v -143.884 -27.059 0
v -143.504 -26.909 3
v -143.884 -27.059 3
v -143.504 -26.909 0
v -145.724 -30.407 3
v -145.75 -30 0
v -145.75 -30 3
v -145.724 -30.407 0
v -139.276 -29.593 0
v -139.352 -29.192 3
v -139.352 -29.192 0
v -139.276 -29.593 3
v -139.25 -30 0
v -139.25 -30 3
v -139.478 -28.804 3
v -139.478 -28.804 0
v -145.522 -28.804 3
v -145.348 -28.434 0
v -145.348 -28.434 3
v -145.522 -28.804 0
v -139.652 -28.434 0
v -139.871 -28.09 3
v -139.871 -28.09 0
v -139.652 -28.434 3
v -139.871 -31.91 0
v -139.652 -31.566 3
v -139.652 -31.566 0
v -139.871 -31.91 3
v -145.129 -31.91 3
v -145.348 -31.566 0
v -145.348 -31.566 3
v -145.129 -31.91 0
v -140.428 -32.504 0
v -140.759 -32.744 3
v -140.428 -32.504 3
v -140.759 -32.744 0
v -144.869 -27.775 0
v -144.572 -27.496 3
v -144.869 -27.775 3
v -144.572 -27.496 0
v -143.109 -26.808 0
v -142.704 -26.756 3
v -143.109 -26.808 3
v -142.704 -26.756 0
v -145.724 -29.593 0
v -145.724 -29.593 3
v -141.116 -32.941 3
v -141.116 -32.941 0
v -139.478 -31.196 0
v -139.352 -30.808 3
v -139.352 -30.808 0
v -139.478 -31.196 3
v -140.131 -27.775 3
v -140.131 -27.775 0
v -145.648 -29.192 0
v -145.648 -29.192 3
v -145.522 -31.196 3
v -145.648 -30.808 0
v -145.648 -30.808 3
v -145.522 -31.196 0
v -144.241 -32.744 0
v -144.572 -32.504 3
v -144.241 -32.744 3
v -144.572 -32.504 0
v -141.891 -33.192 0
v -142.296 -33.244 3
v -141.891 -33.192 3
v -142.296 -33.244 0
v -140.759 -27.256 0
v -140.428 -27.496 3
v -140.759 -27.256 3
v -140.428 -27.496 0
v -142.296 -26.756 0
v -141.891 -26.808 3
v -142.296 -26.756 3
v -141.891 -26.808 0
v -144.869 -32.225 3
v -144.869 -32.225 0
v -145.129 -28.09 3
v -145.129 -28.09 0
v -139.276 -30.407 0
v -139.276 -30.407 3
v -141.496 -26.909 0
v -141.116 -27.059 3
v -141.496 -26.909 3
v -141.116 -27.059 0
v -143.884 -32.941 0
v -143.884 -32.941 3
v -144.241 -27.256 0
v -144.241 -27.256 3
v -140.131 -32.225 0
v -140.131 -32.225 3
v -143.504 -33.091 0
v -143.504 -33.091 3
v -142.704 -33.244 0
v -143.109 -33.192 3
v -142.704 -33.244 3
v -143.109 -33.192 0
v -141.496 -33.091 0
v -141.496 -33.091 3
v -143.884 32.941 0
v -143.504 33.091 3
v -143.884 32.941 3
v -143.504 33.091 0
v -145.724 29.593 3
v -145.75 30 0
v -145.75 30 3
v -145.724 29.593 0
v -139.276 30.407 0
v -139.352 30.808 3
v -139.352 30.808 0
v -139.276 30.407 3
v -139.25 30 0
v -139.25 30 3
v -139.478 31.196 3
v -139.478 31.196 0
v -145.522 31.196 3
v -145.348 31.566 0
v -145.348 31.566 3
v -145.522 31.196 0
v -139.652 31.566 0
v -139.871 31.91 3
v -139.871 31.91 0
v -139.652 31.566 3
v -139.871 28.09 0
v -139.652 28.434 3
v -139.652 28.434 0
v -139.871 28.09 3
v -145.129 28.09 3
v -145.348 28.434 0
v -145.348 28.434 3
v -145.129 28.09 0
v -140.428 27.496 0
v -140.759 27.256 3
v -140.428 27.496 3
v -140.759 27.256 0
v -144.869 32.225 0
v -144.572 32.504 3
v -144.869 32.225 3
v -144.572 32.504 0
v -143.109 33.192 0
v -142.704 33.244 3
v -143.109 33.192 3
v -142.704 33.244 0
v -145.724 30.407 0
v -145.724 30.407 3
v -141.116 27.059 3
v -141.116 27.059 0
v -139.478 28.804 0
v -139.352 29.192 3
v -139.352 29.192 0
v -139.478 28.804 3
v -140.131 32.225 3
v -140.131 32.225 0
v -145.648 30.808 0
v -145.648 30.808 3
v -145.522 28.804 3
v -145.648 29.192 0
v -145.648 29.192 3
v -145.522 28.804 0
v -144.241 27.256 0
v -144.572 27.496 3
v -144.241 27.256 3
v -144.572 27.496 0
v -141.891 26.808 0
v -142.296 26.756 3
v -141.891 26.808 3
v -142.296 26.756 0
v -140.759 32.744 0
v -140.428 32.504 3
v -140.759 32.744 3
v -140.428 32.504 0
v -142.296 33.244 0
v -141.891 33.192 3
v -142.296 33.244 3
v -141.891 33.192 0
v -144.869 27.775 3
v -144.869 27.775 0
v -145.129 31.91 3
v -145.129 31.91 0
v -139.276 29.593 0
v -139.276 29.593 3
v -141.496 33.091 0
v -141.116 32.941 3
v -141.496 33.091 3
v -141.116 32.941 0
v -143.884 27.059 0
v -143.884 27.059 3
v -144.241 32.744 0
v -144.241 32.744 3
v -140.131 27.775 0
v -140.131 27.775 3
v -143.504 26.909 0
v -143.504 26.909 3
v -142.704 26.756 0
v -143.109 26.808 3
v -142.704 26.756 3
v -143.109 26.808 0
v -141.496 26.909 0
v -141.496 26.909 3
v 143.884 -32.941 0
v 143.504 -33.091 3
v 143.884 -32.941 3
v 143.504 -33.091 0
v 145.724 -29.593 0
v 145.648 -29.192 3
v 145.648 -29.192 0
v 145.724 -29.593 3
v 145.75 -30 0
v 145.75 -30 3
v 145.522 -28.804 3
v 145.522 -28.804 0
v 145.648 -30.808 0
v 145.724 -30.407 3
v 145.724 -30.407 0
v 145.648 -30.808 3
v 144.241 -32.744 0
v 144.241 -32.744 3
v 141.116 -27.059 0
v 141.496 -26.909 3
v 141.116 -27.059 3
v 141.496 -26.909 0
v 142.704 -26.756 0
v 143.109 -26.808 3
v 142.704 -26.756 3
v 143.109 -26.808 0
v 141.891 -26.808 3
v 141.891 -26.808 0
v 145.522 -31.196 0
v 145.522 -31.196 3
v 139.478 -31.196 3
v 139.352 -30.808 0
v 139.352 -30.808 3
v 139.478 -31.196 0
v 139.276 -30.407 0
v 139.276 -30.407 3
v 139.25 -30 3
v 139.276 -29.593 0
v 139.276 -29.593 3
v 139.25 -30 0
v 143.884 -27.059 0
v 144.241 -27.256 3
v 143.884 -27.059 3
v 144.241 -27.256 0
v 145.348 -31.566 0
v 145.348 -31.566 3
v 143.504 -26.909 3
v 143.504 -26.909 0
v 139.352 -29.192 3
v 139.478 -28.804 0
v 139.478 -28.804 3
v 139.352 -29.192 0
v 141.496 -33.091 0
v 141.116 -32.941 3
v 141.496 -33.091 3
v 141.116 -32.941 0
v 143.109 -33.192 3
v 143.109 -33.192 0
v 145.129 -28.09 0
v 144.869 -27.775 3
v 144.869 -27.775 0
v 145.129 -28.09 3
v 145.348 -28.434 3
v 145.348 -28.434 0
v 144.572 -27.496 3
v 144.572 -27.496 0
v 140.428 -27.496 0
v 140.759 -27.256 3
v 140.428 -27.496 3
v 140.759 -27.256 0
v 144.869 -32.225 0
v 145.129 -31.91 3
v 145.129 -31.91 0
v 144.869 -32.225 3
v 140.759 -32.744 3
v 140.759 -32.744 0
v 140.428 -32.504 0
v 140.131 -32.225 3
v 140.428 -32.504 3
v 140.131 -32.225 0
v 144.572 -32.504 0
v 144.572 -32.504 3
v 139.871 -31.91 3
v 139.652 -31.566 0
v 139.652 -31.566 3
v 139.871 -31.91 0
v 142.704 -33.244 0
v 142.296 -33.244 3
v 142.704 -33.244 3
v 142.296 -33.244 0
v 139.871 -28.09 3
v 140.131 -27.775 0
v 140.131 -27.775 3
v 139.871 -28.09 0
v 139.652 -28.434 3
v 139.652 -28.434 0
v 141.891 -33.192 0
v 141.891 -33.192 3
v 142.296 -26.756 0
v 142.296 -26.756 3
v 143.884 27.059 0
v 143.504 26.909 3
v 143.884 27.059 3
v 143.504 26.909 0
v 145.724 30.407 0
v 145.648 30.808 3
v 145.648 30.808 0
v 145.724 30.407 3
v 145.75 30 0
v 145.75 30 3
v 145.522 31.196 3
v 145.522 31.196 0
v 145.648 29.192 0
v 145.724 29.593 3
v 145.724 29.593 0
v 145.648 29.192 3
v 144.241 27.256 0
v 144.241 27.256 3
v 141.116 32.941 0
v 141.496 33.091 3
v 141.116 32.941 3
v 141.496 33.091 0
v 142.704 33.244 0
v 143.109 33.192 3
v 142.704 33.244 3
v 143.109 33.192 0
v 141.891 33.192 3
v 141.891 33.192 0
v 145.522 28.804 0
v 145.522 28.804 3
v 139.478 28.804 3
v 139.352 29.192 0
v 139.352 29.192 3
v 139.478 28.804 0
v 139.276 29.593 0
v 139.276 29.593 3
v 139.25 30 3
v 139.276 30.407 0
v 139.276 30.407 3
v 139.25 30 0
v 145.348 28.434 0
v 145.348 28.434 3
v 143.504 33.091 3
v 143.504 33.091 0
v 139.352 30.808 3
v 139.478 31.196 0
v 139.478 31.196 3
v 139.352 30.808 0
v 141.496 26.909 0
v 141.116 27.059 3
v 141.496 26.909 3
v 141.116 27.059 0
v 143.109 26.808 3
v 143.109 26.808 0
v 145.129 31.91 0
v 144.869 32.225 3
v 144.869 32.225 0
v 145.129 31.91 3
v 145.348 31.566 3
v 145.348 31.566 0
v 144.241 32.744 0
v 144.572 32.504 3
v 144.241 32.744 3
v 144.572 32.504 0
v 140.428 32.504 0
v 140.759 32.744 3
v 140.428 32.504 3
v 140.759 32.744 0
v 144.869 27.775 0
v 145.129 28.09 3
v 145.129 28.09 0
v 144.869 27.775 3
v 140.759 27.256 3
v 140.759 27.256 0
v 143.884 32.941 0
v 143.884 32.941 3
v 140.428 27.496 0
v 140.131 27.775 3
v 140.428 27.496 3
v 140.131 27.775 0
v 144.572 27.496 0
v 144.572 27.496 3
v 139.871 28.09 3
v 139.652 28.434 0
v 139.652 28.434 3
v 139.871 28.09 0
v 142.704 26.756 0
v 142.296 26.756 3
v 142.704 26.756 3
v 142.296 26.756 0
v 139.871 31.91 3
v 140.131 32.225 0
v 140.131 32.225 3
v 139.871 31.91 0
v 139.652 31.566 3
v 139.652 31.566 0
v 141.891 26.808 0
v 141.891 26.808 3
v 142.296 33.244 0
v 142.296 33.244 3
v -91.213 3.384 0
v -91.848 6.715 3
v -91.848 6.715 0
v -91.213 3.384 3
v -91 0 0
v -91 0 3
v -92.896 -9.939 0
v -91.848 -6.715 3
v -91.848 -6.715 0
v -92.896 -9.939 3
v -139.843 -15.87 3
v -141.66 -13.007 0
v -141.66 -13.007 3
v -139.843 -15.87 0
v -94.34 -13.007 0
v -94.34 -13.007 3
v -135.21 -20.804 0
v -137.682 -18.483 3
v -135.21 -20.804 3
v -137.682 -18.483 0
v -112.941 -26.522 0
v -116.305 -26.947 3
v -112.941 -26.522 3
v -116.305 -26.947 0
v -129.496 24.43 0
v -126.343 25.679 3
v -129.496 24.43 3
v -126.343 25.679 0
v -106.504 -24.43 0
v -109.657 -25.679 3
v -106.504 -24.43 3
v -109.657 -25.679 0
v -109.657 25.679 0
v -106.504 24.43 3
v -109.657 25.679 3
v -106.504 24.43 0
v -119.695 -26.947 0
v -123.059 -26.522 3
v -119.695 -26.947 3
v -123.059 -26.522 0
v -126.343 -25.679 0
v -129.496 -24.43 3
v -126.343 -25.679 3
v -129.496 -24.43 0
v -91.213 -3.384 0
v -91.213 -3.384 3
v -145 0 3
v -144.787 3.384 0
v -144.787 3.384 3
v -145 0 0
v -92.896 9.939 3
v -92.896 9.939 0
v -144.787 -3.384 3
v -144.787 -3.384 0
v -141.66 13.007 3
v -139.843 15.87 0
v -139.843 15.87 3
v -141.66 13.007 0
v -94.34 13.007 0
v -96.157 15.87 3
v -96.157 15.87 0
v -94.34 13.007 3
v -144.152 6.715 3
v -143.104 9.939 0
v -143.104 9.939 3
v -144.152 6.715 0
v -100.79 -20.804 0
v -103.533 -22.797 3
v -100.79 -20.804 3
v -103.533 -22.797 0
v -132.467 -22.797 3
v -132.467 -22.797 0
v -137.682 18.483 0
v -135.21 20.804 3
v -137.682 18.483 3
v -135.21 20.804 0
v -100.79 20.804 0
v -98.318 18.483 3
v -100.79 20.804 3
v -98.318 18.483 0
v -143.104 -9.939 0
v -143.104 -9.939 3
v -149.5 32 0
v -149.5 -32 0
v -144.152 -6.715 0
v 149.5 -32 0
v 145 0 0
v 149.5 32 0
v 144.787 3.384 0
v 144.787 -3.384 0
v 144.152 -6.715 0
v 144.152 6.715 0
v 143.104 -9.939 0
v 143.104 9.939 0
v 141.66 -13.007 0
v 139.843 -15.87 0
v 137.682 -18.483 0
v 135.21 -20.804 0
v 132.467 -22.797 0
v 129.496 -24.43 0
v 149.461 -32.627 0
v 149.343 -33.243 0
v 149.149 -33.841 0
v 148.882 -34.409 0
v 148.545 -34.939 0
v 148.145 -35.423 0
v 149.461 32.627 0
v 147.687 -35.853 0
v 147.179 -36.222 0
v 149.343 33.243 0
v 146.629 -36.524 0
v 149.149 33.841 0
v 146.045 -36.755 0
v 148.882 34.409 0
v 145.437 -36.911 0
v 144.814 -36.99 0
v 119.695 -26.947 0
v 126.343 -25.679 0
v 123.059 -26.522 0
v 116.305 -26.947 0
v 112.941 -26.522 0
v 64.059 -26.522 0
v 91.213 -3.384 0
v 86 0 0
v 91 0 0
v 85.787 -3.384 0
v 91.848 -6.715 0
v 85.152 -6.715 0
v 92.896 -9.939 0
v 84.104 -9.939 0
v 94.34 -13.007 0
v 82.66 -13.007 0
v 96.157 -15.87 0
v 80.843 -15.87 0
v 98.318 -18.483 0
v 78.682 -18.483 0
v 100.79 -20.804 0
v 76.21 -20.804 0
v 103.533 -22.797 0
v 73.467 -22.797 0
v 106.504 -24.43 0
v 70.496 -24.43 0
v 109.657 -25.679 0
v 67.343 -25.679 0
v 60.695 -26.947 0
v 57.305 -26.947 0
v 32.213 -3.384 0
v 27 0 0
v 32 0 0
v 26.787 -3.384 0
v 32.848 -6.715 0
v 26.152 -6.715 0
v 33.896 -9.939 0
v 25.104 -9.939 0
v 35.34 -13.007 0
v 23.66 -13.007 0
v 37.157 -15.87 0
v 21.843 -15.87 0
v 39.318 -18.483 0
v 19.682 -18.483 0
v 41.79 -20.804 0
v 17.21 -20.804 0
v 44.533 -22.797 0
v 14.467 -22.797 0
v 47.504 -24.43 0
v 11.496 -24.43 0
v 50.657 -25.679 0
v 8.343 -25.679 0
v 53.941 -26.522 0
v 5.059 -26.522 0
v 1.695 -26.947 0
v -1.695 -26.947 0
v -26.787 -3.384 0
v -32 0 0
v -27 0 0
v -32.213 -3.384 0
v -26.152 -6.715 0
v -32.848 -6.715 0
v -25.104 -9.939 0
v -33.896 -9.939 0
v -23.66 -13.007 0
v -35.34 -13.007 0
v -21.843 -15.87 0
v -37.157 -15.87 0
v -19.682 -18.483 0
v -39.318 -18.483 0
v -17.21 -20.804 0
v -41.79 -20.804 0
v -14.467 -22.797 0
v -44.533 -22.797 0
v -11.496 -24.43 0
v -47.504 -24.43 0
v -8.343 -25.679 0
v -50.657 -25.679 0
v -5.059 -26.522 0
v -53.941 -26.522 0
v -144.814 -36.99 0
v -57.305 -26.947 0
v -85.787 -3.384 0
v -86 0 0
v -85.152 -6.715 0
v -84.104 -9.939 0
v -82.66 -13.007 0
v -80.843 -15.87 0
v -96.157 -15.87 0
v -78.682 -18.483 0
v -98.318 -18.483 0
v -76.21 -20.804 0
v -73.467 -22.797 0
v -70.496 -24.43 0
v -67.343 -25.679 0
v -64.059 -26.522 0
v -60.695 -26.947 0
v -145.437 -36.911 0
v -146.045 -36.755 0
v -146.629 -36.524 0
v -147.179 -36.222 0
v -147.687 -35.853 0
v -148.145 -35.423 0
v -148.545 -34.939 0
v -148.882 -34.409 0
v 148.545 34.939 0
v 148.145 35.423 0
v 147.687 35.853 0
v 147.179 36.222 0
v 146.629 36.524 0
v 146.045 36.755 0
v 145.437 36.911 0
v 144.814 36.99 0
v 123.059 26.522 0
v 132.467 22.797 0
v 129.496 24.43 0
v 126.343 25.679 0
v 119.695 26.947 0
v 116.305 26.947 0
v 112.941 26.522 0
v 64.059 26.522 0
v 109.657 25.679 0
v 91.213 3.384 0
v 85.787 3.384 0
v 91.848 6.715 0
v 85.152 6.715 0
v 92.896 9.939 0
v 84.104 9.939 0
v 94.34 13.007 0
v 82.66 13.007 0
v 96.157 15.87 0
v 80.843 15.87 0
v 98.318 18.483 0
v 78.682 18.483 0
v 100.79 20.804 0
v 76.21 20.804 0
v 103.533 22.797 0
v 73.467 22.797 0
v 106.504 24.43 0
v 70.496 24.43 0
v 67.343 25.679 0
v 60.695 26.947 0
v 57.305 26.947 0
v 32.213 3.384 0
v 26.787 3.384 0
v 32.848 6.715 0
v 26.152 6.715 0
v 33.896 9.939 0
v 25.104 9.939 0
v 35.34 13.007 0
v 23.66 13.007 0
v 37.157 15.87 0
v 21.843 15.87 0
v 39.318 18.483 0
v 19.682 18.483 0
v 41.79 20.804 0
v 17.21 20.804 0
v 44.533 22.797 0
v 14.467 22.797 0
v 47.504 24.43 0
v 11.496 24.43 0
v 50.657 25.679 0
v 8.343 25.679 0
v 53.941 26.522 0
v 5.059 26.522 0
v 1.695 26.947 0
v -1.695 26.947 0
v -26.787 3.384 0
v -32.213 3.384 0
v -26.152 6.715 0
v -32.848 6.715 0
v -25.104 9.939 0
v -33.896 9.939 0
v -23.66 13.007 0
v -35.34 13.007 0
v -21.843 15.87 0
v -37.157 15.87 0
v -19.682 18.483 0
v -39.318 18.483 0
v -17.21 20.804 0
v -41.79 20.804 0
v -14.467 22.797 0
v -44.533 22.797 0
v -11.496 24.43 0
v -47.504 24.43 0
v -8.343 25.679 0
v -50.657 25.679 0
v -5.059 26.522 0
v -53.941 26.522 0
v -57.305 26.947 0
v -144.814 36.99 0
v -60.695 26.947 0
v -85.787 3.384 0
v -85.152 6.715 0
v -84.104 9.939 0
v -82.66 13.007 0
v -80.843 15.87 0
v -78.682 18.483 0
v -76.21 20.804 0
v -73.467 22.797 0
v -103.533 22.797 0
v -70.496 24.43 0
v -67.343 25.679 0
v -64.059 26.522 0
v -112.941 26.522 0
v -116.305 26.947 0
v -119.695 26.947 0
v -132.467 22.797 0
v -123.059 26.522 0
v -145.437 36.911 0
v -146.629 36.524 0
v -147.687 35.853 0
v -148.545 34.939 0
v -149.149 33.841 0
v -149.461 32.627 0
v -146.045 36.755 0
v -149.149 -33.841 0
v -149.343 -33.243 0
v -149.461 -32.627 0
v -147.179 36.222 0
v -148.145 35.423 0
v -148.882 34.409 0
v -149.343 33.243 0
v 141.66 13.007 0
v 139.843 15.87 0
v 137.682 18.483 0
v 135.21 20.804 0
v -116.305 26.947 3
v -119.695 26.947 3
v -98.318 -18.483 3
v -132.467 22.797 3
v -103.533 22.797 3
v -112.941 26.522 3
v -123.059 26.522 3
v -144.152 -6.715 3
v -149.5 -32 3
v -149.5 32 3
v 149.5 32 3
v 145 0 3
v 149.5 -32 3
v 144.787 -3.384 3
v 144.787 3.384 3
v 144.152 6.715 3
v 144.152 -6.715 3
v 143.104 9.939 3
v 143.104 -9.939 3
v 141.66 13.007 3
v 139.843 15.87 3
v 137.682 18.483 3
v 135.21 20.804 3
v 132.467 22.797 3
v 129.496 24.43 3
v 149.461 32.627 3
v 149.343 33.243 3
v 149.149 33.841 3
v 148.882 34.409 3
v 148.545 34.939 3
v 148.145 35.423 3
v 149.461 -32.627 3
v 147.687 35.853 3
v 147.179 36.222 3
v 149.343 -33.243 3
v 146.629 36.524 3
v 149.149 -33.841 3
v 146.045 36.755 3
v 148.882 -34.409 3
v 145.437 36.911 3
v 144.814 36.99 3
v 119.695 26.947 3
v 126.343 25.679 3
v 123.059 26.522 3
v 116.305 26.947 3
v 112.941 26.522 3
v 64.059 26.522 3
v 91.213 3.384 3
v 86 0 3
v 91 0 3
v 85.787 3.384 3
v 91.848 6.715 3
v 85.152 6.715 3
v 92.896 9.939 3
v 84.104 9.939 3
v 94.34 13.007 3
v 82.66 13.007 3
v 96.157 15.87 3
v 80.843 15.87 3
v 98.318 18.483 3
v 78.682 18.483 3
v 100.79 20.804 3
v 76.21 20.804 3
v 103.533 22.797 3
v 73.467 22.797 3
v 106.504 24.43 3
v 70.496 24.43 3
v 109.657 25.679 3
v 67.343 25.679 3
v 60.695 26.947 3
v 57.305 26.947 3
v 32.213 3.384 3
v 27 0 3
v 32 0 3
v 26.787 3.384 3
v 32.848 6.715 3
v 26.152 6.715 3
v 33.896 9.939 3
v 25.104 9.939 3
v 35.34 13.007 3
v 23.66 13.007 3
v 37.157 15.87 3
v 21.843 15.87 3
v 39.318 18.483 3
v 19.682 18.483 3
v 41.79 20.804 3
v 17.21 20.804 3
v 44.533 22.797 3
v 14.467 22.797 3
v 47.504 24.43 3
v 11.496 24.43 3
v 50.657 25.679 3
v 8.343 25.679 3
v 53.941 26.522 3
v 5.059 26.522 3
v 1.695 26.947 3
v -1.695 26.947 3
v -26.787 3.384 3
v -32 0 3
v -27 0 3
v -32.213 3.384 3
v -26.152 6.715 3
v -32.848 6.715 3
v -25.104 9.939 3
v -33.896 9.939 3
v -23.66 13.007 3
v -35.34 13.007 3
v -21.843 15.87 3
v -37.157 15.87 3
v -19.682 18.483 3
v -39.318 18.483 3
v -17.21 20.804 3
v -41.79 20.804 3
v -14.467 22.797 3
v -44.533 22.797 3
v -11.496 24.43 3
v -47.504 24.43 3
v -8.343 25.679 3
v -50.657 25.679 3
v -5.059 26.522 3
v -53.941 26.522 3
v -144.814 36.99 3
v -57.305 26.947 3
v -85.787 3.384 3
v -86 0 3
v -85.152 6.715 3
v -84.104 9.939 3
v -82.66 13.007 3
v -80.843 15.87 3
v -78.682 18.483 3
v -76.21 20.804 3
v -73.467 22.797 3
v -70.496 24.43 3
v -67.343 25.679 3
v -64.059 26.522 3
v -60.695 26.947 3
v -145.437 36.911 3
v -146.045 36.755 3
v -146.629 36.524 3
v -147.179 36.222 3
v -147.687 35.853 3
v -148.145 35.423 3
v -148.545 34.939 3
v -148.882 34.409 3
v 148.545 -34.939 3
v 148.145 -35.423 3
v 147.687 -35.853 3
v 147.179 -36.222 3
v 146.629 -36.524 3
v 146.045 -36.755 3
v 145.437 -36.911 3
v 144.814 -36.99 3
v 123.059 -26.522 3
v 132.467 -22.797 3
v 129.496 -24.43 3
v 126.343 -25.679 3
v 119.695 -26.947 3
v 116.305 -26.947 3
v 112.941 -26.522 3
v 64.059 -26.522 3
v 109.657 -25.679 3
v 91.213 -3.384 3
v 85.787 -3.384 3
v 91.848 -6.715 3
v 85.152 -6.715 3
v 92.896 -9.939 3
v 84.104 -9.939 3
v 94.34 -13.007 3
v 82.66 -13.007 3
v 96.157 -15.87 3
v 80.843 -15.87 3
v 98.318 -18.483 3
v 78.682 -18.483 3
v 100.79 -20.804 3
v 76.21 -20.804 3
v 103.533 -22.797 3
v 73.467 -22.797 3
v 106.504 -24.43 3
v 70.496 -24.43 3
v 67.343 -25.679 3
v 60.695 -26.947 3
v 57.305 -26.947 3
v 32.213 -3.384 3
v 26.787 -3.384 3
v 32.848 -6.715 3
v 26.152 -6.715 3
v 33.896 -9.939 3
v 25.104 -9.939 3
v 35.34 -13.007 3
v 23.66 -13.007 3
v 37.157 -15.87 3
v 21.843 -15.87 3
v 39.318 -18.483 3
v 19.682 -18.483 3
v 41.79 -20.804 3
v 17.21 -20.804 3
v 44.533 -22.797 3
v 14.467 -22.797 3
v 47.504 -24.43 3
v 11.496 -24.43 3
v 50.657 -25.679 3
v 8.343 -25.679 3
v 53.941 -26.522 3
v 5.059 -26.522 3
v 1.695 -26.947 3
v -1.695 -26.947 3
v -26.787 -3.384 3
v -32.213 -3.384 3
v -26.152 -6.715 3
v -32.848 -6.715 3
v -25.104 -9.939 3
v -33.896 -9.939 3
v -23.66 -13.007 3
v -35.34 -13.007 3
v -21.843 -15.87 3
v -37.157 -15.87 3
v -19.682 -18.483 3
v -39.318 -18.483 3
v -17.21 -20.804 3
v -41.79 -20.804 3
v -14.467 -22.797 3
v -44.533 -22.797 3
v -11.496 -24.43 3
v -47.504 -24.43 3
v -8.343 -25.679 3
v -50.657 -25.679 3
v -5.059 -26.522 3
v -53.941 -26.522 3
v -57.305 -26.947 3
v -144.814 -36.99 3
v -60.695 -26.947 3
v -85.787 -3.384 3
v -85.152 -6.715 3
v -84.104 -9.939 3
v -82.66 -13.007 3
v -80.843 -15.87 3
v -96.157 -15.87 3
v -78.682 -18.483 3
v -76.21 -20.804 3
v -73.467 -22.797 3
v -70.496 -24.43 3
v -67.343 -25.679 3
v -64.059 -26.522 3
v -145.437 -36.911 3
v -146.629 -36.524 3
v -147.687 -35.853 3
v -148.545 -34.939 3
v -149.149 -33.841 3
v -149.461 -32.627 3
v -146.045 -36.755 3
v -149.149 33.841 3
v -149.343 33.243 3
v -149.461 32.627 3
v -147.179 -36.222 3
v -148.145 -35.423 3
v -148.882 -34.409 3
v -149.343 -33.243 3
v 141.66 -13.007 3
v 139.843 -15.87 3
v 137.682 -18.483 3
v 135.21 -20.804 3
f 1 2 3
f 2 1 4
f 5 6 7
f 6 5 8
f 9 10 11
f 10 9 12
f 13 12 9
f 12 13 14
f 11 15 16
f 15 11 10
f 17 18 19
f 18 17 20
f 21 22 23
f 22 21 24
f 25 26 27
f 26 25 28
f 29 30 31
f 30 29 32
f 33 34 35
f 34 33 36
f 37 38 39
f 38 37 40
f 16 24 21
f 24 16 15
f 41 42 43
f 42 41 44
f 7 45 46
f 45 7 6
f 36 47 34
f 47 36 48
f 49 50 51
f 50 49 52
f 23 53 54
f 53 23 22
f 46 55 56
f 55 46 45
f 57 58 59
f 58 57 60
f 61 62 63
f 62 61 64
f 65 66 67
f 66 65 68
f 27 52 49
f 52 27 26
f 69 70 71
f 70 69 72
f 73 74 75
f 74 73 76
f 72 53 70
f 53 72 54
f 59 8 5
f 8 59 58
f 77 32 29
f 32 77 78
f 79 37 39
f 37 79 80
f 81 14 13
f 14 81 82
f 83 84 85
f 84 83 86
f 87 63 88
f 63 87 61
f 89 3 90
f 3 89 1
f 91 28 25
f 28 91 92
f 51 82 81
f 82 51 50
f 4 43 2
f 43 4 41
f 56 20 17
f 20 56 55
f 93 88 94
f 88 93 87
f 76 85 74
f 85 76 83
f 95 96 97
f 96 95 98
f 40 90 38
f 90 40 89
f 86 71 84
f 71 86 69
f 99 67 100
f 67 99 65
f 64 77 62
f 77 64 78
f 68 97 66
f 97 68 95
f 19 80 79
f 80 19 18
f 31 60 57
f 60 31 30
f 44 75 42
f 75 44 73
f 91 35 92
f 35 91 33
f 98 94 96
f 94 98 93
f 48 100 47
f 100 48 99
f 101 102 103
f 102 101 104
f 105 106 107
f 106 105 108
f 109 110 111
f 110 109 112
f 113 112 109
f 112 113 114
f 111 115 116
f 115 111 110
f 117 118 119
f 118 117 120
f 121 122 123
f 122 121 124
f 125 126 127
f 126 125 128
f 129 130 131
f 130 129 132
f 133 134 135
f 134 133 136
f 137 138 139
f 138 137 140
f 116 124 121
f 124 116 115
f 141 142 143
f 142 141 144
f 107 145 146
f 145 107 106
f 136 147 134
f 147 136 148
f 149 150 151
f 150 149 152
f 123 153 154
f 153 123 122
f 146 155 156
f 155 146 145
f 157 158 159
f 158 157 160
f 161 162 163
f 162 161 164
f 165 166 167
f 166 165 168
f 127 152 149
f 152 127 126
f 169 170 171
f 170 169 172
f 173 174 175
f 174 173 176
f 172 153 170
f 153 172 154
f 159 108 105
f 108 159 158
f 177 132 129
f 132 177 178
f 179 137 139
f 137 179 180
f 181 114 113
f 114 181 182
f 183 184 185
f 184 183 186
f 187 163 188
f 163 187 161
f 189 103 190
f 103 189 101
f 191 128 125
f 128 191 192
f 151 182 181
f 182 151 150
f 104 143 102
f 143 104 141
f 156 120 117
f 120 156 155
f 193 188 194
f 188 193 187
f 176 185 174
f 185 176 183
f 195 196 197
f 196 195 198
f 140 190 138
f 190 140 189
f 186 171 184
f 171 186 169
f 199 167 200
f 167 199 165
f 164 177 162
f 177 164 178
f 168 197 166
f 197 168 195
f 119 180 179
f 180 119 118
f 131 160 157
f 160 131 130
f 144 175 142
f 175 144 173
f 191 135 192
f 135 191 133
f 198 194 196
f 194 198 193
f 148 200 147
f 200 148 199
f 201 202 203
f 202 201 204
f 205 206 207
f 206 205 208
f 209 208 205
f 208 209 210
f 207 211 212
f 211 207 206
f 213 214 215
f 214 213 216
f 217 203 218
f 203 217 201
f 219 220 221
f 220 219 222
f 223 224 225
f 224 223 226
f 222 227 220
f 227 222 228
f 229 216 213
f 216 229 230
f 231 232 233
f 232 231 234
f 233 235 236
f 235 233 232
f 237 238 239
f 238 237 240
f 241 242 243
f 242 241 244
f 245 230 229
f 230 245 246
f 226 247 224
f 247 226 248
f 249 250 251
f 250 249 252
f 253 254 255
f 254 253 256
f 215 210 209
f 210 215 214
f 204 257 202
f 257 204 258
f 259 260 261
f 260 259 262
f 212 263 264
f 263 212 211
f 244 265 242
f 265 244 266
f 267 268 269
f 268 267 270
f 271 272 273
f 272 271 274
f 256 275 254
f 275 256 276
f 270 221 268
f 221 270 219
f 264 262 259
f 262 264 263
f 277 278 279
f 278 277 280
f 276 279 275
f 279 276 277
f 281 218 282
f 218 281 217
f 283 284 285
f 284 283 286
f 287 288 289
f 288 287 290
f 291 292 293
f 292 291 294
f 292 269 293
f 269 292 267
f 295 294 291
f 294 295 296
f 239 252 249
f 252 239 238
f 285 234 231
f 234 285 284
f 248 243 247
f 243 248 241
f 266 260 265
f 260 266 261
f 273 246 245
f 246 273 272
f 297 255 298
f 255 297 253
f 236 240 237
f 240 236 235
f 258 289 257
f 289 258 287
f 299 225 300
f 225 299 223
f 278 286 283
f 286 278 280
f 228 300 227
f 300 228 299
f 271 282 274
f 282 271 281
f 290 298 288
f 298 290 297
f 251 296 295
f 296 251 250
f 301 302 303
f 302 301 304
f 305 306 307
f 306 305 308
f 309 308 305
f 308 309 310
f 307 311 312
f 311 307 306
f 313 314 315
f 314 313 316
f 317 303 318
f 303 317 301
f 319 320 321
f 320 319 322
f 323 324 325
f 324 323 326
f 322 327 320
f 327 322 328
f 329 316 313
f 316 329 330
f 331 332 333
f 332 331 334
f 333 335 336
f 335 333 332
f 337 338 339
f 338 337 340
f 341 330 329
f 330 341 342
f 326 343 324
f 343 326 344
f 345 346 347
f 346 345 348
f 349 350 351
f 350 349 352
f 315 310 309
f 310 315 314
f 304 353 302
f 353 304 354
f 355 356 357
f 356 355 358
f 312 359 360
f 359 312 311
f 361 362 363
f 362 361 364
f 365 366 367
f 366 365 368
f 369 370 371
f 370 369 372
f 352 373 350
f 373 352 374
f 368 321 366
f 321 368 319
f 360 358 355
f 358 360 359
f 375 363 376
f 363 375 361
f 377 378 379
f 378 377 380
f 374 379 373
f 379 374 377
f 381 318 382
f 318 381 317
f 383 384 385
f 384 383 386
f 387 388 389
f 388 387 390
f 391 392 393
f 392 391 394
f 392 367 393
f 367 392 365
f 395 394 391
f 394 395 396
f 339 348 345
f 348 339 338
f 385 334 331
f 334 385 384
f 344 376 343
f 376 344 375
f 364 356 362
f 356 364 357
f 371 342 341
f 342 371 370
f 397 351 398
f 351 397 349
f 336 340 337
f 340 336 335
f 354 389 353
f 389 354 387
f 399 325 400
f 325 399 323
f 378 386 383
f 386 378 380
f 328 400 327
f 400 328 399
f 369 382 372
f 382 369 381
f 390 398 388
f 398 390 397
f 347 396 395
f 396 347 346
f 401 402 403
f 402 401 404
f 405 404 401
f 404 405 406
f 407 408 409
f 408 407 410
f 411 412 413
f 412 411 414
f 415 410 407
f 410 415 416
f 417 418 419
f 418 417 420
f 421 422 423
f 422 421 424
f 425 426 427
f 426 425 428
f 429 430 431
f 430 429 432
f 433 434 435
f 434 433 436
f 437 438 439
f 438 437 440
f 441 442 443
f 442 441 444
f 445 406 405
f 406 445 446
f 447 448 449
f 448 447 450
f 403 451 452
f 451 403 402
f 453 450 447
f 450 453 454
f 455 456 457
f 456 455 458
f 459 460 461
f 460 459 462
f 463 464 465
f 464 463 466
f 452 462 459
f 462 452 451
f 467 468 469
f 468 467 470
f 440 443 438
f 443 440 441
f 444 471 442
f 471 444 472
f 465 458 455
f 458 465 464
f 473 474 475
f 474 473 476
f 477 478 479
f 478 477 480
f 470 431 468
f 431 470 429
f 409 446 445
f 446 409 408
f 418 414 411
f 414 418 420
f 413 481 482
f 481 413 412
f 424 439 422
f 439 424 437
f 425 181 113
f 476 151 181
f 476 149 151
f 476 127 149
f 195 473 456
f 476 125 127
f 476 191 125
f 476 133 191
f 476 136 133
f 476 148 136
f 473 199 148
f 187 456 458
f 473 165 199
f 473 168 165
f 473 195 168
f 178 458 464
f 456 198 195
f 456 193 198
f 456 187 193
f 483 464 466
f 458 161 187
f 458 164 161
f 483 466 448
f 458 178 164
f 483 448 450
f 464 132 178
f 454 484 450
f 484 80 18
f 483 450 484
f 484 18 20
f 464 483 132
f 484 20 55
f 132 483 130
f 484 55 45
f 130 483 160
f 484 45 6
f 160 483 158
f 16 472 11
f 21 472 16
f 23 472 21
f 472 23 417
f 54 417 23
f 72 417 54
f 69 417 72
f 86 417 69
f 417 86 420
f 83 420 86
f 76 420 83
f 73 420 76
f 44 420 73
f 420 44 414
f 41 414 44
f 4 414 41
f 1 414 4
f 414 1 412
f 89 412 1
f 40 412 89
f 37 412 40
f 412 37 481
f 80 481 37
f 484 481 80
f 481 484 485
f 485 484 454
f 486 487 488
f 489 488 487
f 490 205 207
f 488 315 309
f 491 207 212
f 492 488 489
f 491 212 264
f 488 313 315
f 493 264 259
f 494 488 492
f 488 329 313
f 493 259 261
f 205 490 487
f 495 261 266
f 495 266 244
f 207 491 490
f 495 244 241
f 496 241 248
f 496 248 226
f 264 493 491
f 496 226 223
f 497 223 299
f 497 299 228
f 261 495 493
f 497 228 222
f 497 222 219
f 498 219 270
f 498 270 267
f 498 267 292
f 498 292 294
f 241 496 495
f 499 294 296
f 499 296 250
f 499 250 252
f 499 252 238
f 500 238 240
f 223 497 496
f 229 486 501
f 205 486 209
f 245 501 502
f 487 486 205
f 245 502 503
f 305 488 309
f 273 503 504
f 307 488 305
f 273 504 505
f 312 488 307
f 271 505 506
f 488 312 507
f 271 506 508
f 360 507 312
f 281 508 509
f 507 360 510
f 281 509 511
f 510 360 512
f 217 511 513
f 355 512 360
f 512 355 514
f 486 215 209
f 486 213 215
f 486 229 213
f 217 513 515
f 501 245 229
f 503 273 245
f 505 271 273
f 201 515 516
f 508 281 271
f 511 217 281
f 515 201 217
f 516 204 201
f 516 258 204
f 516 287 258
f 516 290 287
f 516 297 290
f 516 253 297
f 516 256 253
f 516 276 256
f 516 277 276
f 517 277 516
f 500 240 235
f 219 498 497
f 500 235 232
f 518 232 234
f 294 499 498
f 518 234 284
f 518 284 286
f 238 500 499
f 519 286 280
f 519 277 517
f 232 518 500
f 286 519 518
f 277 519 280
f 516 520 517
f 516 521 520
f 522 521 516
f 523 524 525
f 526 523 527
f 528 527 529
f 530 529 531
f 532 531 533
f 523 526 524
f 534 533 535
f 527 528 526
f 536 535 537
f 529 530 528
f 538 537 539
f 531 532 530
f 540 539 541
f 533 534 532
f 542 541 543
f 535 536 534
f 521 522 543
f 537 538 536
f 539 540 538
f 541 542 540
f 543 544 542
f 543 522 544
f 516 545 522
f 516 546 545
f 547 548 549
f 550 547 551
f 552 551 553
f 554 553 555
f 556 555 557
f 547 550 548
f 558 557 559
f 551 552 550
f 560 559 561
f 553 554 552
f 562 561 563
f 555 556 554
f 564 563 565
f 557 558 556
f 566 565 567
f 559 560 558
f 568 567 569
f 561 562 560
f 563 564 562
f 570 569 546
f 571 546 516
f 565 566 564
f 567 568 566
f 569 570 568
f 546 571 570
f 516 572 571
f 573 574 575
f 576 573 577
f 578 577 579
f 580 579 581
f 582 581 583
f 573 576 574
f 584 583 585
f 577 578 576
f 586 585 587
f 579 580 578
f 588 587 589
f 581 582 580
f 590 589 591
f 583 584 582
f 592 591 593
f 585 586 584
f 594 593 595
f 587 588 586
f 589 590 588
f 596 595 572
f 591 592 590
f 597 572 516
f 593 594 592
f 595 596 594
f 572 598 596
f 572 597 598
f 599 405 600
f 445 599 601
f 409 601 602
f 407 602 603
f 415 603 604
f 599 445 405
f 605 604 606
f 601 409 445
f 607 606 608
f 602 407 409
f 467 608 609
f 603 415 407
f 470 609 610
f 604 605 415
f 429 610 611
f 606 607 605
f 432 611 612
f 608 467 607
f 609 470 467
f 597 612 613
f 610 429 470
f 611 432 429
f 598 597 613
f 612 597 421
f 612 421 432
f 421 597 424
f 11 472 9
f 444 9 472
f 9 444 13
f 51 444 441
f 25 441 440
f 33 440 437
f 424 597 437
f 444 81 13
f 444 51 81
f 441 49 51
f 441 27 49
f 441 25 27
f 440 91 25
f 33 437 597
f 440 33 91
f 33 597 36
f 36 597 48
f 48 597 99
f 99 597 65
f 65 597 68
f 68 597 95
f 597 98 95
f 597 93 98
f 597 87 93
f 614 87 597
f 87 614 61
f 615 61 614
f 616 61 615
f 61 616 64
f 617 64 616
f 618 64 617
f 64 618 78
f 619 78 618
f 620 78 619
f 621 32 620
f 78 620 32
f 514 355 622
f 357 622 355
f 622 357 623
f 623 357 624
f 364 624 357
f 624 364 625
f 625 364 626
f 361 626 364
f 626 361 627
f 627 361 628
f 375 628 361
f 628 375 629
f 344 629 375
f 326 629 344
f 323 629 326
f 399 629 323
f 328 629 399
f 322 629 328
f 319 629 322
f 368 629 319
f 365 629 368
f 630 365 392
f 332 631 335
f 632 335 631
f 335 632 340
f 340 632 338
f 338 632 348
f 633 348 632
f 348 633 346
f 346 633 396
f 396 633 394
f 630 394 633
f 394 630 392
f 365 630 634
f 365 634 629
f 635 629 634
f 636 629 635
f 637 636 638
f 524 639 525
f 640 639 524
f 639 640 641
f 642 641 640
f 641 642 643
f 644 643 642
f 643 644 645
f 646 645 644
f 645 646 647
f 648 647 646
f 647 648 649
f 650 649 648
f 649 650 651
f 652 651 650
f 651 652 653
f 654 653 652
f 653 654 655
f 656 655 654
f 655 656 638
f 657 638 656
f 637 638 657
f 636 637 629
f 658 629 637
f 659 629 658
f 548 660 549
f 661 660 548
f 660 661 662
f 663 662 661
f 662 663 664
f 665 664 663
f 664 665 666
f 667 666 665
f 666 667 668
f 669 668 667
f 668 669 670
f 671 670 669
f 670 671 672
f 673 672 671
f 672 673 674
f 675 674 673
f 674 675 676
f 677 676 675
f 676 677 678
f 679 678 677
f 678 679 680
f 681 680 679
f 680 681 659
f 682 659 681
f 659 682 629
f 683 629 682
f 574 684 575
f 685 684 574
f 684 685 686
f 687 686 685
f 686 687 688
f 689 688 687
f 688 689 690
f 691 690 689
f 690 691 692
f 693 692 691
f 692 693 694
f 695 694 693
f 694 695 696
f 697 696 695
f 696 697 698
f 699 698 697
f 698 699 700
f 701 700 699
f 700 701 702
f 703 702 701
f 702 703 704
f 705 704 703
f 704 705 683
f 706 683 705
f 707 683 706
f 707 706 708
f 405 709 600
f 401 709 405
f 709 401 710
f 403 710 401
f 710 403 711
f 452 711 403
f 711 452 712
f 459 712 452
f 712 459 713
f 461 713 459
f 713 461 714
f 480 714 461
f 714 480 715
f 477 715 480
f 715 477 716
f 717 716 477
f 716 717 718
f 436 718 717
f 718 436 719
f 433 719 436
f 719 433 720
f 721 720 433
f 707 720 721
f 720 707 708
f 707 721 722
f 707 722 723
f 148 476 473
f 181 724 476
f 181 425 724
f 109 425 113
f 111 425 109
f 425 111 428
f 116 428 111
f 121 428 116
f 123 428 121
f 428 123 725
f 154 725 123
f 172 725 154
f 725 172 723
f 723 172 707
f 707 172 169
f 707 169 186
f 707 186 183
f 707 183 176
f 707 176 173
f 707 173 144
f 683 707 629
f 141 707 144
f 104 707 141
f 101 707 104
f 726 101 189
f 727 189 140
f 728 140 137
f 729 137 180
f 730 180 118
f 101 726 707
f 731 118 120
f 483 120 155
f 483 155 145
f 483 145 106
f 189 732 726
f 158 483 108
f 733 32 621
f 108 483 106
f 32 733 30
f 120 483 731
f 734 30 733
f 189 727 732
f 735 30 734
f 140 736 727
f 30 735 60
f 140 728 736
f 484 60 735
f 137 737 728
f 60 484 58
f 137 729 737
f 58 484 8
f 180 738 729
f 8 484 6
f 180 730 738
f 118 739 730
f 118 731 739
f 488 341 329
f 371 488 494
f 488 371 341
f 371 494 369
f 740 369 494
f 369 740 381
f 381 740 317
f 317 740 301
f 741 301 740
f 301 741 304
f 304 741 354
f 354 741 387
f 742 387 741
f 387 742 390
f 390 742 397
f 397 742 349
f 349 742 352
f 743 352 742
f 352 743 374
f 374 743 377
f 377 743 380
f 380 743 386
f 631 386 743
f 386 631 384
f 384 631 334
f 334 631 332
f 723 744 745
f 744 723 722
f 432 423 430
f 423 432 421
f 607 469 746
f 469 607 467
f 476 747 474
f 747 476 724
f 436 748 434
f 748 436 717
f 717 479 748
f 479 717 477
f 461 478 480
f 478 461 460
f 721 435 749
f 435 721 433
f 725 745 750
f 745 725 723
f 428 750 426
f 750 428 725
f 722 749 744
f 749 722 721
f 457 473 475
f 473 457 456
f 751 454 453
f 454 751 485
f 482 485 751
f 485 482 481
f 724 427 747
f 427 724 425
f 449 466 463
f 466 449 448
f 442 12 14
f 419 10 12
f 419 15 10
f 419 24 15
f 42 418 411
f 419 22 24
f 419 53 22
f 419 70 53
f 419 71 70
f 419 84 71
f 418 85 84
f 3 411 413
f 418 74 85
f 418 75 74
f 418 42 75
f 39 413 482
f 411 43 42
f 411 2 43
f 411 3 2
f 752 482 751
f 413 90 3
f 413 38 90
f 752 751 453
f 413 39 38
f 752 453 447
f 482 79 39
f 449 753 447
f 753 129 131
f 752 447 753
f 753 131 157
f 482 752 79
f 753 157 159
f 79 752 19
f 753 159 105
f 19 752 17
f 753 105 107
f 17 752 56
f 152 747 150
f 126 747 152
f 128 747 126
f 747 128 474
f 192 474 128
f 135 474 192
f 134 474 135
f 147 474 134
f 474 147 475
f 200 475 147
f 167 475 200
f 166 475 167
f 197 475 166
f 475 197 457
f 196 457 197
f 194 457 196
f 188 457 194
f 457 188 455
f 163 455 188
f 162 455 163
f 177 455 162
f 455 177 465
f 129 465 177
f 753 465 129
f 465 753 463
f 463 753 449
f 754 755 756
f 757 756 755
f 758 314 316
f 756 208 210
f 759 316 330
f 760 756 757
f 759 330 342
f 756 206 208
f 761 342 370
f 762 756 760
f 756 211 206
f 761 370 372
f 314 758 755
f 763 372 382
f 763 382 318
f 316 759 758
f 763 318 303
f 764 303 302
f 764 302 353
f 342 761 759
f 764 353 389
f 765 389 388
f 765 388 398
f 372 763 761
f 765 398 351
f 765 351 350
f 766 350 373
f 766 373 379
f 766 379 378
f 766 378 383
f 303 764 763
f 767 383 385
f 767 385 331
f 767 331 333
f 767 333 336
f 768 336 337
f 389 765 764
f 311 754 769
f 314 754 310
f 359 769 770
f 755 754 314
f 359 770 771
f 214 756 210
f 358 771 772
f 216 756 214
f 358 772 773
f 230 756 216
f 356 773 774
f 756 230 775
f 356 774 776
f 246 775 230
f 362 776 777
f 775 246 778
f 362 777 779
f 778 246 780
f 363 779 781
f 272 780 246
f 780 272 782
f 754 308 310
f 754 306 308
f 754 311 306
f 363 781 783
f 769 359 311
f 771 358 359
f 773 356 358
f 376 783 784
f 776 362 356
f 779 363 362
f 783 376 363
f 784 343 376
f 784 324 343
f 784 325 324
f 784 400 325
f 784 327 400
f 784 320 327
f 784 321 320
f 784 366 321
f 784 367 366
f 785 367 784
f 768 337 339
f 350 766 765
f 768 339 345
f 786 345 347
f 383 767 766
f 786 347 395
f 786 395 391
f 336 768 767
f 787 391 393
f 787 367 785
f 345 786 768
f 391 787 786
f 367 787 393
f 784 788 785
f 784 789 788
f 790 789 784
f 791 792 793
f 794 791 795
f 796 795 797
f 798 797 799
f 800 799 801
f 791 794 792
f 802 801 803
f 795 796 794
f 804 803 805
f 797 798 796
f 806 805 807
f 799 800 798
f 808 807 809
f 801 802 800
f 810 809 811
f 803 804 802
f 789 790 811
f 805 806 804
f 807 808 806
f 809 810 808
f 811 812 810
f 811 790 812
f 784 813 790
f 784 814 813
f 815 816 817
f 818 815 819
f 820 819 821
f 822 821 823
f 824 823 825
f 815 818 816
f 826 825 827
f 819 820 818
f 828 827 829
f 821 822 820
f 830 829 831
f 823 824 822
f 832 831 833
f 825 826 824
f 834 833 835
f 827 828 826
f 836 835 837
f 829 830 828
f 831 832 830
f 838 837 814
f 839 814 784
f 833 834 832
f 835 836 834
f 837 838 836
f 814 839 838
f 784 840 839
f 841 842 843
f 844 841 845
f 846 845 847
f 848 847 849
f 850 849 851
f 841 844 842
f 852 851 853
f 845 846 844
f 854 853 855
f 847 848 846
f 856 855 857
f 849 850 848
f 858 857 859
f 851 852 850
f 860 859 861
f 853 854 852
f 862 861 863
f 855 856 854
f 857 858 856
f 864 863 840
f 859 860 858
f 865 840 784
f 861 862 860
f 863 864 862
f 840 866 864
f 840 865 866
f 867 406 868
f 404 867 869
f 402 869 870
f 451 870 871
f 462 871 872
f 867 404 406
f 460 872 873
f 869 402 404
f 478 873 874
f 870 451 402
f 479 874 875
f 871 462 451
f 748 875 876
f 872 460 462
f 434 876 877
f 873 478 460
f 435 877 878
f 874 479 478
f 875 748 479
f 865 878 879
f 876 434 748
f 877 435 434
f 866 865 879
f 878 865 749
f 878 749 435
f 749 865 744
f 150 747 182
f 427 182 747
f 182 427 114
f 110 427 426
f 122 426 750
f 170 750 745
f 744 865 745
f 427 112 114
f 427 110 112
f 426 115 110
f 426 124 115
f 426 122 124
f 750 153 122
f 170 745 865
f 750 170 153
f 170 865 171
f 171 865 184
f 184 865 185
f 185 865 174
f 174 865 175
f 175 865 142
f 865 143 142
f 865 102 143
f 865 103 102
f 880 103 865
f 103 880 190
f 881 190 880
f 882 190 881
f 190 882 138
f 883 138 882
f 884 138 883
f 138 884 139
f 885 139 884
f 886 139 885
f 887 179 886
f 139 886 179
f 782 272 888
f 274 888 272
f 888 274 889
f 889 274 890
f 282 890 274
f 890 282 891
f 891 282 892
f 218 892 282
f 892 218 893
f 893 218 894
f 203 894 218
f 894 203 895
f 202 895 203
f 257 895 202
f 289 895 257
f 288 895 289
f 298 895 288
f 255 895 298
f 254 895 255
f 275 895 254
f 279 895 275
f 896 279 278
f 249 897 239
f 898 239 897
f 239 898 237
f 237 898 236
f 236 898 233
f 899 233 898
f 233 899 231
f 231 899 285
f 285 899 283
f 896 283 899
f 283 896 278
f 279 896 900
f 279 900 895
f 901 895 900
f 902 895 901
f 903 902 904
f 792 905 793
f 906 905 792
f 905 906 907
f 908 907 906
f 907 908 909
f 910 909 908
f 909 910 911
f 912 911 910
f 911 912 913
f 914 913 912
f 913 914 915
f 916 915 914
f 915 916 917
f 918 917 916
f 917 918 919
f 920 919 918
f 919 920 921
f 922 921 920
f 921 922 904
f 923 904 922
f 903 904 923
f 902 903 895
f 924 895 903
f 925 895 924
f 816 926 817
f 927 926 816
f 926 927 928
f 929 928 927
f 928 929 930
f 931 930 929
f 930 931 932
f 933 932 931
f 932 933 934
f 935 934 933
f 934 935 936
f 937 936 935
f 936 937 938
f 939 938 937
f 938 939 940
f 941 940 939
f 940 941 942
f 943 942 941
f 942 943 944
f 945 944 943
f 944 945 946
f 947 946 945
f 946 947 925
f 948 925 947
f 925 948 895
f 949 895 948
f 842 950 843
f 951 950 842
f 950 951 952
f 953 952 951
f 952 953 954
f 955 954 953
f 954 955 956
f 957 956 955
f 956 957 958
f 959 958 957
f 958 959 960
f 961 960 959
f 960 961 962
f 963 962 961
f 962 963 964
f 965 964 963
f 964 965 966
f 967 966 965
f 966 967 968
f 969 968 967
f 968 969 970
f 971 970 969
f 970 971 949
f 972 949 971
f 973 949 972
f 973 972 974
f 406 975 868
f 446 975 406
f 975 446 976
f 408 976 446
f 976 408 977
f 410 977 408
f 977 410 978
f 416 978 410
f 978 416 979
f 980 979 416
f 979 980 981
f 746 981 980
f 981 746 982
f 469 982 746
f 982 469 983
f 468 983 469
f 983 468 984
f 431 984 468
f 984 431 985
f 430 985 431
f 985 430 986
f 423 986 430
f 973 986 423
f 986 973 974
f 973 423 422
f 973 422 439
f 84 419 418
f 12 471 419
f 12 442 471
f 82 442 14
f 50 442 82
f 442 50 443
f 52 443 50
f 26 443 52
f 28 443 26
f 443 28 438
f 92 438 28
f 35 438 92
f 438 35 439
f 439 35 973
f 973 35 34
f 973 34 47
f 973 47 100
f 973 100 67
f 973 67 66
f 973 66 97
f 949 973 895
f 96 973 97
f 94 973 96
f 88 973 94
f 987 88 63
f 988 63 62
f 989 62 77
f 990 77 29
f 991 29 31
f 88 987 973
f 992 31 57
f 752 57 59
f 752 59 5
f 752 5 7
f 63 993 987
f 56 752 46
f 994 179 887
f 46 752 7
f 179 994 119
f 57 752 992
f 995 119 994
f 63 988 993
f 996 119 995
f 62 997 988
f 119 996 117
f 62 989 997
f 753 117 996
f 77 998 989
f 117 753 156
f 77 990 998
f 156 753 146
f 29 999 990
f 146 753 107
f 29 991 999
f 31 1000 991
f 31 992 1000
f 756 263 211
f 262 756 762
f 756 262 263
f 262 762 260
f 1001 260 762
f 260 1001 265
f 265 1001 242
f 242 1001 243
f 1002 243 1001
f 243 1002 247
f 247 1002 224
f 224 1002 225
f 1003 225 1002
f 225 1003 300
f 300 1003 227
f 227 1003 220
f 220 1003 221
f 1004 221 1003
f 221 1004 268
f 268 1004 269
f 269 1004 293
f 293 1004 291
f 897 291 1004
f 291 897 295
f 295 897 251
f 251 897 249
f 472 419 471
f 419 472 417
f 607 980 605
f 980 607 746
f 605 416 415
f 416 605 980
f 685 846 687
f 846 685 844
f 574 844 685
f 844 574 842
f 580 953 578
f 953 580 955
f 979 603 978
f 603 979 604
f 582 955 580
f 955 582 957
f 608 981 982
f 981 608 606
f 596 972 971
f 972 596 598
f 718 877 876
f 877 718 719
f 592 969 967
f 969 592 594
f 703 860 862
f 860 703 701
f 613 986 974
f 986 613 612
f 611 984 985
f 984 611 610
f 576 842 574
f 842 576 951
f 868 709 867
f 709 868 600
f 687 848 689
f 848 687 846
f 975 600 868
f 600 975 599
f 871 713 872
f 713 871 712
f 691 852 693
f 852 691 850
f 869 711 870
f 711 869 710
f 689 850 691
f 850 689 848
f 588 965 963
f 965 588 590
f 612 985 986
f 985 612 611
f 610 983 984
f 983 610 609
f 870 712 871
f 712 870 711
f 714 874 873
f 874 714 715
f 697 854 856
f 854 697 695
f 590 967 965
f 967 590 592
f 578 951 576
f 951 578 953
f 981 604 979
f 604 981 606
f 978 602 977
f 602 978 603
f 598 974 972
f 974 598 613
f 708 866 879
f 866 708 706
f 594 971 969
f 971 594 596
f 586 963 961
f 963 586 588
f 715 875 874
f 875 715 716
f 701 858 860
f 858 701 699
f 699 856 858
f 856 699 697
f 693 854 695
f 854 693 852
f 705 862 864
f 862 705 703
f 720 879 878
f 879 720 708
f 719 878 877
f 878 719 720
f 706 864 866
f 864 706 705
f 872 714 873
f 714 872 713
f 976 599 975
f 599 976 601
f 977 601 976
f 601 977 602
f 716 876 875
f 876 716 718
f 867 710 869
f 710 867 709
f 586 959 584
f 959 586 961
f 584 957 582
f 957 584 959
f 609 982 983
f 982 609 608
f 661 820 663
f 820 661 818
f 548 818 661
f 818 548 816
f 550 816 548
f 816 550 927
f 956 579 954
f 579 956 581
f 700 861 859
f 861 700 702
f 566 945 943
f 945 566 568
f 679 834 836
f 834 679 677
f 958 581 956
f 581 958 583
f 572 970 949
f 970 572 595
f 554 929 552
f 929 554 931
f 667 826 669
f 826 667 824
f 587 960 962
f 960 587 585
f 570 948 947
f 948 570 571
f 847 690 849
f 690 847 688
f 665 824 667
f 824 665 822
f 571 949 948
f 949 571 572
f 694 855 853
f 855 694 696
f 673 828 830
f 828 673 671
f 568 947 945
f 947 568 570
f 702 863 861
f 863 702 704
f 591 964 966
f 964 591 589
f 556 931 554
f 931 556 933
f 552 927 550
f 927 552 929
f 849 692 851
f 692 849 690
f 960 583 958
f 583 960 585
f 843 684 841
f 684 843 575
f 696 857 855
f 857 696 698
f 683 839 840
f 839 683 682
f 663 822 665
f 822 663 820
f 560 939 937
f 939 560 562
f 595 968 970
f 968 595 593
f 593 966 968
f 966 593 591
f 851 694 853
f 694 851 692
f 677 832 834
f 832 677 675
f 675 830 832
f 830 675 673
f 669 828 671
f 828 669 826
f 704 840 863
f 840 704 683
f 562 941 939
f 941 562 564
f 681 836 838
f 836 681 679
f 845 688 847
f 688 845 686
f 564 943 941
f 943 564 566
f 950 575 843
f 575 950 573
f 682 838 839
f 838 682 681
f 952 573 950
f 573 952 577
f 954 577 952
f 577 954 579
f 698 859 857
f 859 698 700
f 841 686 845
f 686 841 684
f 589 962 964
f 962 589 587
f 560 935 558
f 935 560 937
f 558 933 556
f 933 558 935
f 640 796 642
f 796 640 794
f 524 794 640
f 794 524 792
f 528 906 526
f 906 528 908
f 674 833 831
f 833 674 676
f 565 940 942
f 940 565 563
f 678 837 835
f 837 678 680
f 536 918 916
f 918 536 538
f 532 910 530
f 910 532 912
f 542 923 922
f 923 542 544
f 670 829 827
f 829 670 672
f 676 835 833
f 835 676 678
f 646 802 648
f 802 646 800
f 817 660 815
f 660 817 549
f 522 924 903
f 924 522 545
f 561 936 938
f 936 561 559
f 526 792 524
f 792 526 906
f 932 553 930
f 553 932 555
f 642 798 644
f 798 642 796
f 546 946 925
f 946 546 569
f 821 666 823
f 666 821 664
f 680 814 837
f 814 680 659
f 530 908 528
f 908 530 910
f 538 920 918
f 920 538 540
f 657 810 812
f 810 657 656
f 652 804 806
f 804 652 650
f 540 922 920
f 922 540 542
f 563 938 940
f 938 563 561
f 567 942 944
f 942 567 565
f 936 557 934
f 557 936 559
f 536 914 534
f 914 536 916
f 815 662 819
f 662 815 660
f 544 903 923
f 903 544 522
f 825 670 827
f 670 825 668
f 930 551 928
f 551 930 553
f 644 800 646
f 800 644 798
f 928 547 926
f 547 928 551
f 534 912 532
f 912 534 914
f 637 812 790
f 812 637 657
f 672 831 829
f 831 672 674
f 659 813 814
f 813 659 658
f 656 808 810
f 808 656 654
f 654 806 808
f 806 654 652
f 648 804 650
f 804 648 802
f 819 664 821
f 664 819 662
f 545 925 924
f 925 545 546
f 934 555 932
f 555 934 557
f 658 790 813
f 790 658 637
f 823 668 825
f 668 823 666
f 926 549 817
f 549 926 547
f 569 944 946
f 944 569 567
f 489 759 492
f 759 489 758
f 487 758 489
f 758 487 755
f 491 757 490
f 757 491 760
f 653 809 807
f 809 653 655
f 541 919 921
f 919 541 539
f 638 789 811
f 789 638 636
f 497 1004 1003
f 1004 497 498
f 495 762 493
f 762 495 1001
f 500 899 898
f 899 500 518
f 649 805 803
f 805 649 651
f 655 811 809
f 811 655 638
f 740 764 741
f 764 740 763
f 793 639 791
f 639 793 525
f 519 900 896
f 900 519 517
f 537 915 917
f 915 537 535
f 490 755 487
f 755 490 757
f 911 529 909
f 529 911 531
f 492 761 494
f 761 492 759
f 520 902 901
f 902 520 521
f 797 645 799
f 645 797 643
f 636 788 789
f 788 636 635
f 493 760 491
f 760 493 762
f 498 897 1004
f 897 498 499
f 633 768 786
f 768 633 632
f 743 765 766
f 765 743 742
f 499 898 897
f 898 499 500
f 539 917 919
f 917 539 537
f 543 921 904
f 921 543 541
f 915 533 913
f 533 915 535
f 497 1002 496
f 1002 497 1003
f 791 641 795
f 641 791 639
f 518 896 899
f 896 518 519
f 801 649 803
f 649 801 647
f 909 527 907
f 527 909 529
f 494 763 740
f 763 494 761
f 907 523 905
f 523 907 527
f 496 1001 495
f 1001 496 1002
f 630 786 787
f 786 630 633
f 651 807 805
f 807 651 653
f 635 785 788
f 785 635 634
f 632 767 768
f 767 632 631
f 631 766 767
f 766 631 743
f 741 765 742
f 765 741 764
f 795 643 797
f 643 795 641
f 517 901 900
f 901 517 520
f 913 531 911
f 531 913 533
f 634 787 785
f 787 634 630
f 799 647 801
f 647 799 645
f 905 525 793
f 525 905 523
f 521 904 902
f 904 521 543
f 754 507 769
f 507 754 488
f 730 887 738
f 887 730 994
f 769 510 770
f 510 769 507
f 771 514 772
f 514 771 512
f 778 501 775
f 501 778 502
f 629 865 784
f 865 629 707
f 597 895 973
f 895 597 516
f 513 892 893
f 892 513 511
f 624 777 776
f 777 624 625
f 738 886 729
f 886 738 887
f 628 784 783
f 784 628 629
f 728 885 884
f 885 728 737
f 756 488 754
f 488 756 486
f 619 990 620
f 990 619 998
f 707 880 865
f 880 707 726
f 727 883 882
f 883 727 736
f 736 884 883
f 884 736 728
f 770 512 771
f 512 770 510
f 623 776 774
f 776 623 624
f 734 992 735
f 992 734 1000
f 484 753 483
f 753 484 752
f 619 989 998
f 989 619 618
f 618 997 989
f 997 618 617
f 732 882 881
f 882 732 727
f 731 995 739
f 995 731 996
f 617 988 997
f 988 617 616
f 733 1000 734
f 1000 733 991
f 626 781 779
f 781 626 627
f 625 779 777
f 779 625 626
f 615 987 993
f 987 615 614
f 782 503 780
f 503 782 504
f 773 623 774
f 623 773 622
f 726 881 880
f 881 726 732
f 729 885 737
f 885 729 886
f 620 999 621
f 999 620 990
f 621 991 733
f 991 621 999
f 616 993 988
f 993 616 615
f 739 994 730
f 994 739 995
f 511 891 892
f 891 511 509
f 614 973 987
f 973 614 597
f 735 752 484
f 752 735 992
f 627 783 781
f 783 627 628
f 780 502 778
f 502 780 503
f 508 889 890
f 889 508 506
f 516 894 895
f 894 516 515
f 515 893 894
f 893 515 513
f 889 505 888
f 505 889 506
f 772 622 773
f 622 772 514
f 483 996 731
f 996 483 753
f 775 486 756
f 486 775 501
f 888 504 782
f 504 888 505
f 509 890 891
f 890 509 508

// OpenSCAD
$fn = 50;


difference() {
	union() {
		hull() {
			translate(v = [-144.5000000000, 32.0000000000, 0]) {
				cylinder(h = 3, r = 5);
			}
			translate(v = [144.5000000000, 32.0000000000, 0]) {
				cylinder(h = 3, r = 5);
			}
			translate(v = [-144.5000000000, -32.0000000000, 0]) {
				cylinder(h = 3, r = 5);
			}
			translate(v = [144.5000000000, -32.0000000000, 0]) {
				cylinder(h = 3, r = 5);
			}
		}
	}
	union() {
		#translate(v = [-142.5000000000, -30.0000000000, -100.0000000000]) {
			cylinder(h = 200, r = 3.2500000000);
		}
		#translate(v = [-142.5000000000, 30.0000000000, -100.0000000000]) {
			cylinder(h = 200, r = 3.2500000000);
		}
		#translate(v = [142.5000000000, -30.0000000000, -100.0000000000]) {
			cylinder(h = 200, r = 3.2500000000);
		}
		#translate(v = [142.5000000000, 30.0000000000, -100.0000000000]) {
			cylinder(h = 200, r = 3.2500000000);
		}
		#translate(v = [-118.0000000000, 0, 0]) {
			cylinder(h = 3, r = 27.0000000000);
		}
		#translate(v = [-59.0000000000, 0, 0]) {
			cylinder(h = 3, r = 27.0000000000);
		}
		#cylinder(h = 3, r = 27.0000000000);
		#translate(v = [59.0000000000, 0, 0]) {
			cylinder(h = 3, r = 27.0000000000);
		}
		#translate(v = [118.0000000000, 0, 0]) {
			cylinder(h = 3, r = 27.0000000000);
		}
	}
}
